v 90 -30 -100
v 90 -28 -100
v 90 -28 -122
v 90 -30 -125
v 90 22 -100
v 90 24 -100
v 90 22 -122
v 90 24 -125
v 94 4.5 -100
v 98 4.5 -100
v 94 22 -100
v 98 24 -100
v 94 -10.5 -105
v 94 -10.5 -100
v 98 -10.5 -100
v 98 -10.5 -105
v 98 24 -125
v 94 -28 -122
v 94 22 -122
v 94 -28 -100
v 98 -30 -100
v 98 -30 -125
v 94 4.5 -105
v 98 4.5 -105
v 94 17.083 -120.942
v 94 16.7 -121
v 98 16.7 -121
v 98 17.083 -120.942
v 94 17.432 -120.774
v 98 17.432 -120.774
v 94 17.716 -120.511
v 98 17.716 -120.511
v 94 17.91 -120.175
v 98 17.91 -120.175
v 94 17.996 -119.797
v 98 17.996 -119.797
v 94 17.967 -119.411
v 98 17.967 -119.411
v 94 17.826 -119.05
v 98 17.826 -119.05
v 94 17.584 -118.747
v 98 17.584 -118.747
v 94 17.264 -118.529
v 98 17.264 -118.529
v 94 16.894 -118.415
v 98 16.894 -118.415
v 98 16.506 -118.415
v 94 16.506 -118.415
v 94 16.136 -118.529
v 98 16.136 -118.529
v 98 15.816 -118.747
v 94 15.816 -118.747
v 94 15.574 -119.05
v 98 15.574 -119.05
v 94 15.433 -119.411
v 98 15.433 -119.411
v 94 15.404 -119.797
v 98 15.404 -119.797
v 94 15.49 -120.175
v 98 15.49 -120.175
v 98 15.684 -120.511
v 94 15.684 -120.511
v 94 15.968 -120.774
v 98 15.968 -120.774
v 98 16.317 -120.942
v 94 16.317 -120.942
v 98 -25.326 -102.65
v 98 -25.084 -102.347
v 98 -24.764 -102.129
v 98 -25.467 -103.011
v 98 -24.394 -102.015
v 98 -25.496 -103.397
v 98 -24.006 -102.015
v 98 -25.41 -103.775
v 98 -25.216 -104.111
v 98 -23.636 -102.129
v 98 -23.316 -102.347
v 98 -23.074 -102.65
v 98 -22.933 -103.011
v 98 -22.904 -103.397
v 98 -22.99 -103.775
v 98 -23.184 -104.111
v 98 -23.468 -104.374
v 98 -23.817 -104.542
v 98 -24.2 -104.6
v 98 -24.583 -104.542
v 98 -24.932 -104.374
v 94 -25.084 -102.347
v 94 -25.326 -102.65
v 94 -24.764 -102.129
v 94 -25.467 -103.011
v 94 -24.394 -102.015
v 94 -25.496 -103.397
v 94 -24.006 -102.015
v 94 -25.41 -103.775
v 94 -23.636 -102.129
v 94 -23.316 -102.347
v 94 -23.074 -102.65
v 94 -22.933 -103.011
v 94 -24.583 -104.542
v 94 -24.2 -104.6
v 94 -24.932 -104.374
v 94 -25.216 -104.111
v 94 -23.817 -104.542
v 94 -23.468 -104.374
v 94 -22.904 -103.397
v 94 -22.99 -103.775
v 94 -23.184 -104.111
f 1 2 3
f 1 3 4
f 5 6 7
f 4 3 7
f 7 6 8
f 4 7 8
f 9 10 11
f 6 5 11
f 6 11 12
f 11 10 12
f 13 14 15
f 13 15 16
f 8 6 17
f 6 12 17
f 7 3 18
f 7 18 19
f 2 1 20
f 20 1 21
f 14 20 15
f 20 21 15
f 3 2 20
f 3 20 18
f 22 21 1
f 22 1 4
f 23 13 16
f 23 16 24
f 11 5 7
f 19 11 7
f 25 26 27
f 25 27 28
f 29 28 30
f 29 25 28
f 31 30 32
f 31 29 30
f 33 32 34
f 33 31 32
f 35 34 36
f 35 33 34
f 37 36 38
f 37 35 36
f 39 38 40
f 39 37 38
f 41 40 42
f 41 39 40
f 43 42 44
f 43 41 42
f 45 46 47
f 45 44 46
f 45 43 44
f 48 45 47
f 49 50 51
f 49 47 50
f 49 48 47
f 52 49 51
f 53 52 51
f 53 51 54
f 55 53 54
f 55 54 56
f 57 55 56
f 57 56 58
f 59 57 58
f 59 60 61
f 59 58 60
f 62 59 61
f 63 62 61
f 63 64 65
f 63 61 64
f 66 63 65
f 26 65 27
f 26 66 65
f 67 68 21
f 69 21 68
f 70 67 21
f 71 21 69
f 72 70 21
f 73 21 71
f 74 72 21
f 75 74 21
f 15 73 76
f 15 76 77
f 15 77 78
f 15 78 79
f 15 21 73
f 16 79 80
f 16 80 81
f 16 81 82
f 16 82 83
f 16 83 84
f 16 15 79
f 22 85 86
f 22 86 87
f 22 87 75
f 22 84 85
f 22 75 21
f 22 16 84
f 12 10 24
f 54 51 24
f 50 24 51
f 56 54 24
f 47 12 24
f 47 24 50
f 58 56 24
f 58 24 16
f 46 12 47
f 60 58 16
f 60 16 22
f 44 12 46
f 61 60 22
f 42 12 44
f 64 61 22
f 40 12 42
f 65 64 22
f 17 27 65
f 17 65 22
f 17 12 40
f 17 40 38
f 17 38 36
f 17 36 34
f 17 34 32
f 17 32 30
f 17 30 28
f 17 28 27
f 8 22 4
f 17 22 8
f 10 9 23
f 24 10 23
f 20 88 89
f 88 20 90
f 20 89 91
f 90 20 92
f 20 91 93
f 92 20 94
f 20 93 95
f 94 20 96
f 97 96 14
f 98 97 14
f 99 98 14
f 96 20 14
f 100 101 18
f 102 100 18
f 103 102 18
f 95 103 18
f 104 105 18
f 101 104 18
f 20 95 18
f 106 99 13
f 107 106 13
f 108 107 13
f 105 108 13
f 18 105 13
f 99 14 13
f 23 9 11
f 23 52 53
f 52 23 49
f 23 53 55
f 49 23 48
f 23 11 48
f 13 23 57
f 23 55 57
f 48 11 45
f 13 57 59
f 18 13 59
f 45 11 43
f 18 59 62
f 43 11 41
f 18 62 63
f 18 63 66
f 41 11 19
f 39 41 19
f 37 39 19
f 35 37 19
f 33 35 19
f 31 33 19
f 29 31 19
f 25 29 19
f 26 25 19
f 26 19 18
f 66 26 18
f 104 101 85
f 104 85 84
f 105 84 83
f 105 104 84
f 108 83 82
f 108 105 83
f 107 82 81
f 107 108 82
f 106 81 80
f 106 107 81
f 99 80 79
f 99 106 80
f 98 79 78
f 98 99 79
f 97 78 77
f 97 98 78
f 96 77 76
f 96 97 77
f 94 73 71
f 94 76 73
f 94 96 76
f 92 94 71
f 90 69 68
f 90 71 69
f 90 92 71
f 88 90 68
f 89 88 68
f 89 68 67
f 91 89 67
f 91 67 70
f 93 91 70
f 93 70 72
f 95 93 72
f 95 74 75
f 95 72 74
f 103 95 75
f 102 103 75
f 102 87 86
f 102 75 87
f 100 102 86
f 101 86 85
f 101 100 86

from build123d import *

# Parameters (mm, degrees)
SKETCH_13_W               = 25
SKETCH_13_H               = 54
EXTRUDE_6_DEPTH           = 3
EXTRUDE_6_DEPTH_BACK      = 5
SKETCH_16_W               = 22
SKETCH_16_H               = 50
CUT_EXTRUDE_9_DEPTH       = 25
SKETCH_17_W               = 5
SKETCH_17_H               = 15
CUT_EXTRUDE_10_DEPTH      = 30
SKETCH_23_R               = 1.3
CUT_EXTRUDE_11_DEPTH      = 30
CUT_EXTRUDE_11_DEPTH_BACK = 1


with BuildPart() as part:
    # Sketch 13 → Extrude 6 (new body, two sides)
    with BuildSketch(Plane(origin=(95, 0, 0), x_dir=(0, 0, -1), z_dir=(1, 0, 0))) as extrude_6_sk:
        with Locations((112.5, -3)):
            Rectangle(SKETCH_13_W, SKETCH_13_H)
    extrude(amount=EXTRUDE_6_DEPTH)
    extrude(extrude_6_sk.sketch, amount=-EXTRUDE_6_DEPTH_BACK)

    # Sketch 16 → Cut-Extrude 9 (cut)
    with BuildSketch(Plane(origin=(69, 0, 0), x_dir=(0, 0, -1), z_dir=(1, 0, 0))):
        with Locations((111, -3)):
            Rectangle(SKETCH_16_W, SKETCH_16_H)
    extrude(amount=CUT_EXTRUDE_9_DEPTH, mode=Mode.SUBTRACT)

    # Sketch 17 → Cut-Extrude 10 (cut, through all)
    with BuildSketch(Plane(origin=(69, 0, 0), x_dir=(0, 0, -1), z_dir=(1, 0, 0))):
        with Locations((102.5, -3)):
            Rectangle(SKETCH_17_W, SKETCH_17_H)
    extrude(amount=CUT_EXTRUDE_10_DEPTH, mode=Mode.SUBTRACT)

    # Sketch 23 → Cut-Extrude 11 (cut, two sides)
    with BuildSketch(Plane(origin=(69, 0, 0), x_dir=(0, 0, -1), z_dir=(1, 0, 0))) as cut_extrude_11_sk:
        with Locations((119.7, 16.7)):
            Circle(SKETCH_23_R)
        with Locations((103.3, -24.2)):
            Circle(SKETCH_23_R)
    extrude(amount=CUT_EXTRUDE_11_DEPTH, mode=Mode.SUBTRACT)
    extrude(cut_extrude_11_sk.sketch, amount=-CUT_EXTRUDE_11_DEPTH_BACK, mode=Mode.SUBTRACT)


solid = part.part
